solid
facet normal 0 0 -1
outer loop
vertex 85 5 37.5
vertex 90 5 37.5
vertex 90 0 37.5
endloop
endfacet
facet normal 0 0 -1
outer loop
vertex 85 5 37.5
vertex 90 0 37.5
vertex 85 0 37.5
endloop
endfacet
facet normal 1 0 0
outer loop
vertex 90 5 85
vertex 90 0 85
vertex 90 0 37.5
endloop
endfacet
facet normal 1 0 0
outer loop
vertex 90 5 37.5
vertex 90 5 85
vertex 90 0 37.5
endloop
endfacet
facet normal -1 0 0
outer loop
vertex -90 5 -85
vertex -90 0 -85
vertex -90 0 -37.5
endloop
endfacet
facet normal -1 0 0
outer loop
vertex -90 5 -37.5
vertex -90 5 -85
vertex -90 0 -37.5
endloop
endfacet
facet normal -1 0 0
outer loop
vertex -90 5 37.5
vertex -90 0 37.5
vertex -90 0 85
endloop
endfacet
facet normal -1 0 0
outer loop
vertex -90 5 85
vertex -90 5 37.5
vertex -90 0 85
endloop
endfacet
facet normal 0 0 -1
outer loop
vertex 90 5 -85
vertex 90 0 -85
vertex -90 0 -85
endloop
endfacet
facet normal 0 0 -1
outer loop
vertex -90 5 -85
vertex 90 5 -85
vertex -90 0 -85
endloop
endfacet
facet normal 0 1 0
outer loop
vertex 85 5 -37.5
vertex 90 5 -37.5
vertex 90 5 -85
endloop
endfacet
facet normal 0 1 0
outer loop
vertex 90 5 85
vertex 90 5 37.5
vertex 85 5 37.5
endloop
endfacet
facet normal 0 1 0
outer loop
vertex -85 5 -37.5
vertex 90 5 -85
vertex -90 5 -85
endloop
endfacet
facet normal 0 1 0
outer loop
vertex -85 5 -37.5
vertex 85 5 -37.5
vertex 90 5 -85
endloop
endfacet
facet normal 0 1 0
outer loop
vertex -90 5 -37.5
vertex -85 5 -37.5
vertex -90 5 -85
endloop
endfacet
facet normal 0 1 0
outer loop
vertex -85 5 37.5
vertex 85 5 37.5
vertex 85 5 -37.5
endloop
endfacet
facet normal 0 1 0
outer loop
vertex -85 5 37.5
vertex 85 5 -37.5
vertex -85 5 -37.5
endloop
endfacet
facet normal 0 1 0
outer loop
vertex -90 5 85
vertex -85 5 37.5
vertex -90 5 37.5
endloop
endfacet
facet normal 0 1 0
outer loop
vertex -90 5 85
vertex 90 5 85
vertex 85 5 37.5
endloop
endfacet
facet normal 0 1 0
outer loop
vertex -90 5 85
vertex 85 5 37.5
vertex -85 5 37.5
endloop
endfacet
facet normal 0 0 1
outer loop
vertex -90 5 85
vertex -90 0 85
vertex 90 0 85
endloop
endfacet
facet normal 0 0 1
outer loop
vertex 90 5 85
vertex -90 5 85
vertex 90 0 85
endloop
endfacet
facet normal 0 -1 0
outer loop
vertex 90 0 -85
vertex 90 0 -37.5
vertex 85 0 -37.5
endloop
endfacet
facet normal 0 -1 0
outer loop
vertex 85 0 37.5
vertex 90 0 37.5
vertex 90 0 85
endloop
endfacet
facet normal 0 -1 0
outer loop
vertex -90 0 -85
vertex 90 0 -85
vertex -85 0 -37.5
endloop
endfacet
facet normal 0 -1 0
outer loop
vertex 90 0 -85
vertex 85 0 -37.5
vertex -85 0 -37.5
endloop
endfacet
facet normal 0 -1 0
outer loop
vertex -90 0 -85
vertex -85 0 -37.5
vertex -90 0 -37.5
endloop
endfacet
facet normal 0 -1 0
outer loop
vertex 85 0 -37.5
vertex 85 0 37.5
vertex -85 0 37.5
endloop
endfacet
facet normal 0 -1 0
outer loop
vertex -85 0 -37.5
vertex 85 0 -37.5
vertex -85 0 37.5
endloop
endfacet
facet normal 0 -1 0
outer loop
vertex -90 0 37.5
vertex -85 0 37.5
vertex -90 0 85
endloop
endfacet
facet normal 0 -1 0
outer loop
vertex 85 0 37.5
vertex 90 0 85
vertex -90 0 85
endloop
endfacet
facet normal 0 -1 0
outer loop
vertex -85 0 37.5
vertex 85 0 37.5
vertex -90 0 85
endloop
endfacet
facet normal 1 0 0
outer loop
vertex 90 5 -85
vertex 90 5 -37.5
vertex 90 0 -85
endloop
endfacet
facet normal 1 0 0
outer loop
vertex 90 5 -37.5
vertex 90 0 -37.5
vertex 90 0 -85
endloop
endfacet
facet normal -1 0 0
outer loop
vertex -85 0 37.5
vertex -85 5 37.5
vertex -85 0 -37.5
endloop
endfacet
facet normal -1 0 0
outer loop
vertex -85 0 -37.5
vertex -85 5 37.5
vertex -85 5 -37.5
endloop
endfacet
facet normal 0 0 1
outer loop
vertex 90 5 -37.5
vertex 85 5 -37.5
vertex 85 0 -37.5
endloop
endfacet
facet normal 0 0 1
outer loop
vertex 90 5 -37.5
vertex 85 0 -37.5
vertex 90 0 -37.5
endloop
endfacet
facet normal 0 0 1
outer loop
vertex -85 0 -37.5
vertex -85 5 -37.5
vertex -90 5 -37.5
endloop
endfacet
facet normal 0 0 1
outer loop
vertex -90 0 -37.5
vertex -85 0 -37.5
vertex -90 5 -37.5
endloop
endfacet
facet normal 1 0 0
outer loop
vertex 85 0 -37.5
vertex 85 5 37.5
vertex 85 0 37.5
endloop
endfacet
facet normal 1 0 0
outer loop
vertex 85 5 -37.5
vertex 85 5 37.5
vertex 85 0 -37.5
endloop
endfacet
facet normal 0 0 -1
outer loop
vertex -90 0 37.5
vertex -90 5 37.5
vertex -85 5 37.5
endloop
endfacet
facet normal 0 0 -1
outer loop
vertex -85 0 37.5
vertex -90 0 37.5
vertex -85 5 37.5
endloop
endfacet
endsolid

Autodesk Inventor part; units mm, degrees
ref_plane "YZ Plane" through (0, 0, 0) normal (1, 0, 0) x (0, 1, 0)
ref_plane "XZ Plane" through (0, 0, 0) normal (0, 1, 0) x (-1, 0, 0)
ref_plane "XY Plane" through (0, 0, 0) normal (0, 0, 1) x (1, 0, 0)
sketch "Sketch1" plane through (0, 0, 0) normal (0, 1, 0) x (-1, 0, 0)
  line L0 (90, 85) -> (-90, 85)
  line L1 (-90, 85) -> (-90, -85)
  line L2 (-90, -85) -> (90, -85)
  line L3 (90, -85) -> (90, 85)
  line L4 (90, 85) -> (-90, -85) construction
  line L5 (-90, 85) -> (90, -85) construction
  point P0 (0, 0)
  dimension "d0" = 170
  dimension "d1" = 180
extrude "Extrusion1" add sketch "Sketch1" along normal blind 5
sketch "Sketch2" plane through (0, 5, 0) normal (0, 1, 0) x (1, 0, 0)
  line L0 (85, 37.5) -> (95, 37.5)
  line L1 (95, 37.5) -> (95, -37.5)
  line L2 (95, -37.5) -> (85, -37.5)
  line L3 (85, -37.5) -> (85, 37.5)
  line L4 (90, -85) -> (90, 85) projected
  line L5 (85, 37.5) -> (95, -37.5) construction
  line L6 (95, 37.5) -> (85, -37.5) construction
  line L7 (0, 0) -> (0, 85) construction
  line L8 (90, 85) -> (-90, 85) projected
  line L9 (-85, 37.5) -> (-95, 37.5)
  line L10 (-95, 37.5) -> (-95, -37.5)
  line L11 (-95, -37.5) -> (-85, -37.5)
  line L12 (-85, -37.5) -> (-85, 37.5)
  line L13 (-90, -85) -> (-90, 85)
  line L14 (-85, 37.5) -> (-95, -37.5) construction
  line L15 (-95, 37.5) -> (-85, -37.5) construction
  point P0 (90, 0)
  point P1 (-90, 0)
  dimension "d4" = 75
  dimension "d5" = 5
extrude "Extrusion2" cut sketch "Sketch2" against normal blind 10
properties part number "Gel base"
